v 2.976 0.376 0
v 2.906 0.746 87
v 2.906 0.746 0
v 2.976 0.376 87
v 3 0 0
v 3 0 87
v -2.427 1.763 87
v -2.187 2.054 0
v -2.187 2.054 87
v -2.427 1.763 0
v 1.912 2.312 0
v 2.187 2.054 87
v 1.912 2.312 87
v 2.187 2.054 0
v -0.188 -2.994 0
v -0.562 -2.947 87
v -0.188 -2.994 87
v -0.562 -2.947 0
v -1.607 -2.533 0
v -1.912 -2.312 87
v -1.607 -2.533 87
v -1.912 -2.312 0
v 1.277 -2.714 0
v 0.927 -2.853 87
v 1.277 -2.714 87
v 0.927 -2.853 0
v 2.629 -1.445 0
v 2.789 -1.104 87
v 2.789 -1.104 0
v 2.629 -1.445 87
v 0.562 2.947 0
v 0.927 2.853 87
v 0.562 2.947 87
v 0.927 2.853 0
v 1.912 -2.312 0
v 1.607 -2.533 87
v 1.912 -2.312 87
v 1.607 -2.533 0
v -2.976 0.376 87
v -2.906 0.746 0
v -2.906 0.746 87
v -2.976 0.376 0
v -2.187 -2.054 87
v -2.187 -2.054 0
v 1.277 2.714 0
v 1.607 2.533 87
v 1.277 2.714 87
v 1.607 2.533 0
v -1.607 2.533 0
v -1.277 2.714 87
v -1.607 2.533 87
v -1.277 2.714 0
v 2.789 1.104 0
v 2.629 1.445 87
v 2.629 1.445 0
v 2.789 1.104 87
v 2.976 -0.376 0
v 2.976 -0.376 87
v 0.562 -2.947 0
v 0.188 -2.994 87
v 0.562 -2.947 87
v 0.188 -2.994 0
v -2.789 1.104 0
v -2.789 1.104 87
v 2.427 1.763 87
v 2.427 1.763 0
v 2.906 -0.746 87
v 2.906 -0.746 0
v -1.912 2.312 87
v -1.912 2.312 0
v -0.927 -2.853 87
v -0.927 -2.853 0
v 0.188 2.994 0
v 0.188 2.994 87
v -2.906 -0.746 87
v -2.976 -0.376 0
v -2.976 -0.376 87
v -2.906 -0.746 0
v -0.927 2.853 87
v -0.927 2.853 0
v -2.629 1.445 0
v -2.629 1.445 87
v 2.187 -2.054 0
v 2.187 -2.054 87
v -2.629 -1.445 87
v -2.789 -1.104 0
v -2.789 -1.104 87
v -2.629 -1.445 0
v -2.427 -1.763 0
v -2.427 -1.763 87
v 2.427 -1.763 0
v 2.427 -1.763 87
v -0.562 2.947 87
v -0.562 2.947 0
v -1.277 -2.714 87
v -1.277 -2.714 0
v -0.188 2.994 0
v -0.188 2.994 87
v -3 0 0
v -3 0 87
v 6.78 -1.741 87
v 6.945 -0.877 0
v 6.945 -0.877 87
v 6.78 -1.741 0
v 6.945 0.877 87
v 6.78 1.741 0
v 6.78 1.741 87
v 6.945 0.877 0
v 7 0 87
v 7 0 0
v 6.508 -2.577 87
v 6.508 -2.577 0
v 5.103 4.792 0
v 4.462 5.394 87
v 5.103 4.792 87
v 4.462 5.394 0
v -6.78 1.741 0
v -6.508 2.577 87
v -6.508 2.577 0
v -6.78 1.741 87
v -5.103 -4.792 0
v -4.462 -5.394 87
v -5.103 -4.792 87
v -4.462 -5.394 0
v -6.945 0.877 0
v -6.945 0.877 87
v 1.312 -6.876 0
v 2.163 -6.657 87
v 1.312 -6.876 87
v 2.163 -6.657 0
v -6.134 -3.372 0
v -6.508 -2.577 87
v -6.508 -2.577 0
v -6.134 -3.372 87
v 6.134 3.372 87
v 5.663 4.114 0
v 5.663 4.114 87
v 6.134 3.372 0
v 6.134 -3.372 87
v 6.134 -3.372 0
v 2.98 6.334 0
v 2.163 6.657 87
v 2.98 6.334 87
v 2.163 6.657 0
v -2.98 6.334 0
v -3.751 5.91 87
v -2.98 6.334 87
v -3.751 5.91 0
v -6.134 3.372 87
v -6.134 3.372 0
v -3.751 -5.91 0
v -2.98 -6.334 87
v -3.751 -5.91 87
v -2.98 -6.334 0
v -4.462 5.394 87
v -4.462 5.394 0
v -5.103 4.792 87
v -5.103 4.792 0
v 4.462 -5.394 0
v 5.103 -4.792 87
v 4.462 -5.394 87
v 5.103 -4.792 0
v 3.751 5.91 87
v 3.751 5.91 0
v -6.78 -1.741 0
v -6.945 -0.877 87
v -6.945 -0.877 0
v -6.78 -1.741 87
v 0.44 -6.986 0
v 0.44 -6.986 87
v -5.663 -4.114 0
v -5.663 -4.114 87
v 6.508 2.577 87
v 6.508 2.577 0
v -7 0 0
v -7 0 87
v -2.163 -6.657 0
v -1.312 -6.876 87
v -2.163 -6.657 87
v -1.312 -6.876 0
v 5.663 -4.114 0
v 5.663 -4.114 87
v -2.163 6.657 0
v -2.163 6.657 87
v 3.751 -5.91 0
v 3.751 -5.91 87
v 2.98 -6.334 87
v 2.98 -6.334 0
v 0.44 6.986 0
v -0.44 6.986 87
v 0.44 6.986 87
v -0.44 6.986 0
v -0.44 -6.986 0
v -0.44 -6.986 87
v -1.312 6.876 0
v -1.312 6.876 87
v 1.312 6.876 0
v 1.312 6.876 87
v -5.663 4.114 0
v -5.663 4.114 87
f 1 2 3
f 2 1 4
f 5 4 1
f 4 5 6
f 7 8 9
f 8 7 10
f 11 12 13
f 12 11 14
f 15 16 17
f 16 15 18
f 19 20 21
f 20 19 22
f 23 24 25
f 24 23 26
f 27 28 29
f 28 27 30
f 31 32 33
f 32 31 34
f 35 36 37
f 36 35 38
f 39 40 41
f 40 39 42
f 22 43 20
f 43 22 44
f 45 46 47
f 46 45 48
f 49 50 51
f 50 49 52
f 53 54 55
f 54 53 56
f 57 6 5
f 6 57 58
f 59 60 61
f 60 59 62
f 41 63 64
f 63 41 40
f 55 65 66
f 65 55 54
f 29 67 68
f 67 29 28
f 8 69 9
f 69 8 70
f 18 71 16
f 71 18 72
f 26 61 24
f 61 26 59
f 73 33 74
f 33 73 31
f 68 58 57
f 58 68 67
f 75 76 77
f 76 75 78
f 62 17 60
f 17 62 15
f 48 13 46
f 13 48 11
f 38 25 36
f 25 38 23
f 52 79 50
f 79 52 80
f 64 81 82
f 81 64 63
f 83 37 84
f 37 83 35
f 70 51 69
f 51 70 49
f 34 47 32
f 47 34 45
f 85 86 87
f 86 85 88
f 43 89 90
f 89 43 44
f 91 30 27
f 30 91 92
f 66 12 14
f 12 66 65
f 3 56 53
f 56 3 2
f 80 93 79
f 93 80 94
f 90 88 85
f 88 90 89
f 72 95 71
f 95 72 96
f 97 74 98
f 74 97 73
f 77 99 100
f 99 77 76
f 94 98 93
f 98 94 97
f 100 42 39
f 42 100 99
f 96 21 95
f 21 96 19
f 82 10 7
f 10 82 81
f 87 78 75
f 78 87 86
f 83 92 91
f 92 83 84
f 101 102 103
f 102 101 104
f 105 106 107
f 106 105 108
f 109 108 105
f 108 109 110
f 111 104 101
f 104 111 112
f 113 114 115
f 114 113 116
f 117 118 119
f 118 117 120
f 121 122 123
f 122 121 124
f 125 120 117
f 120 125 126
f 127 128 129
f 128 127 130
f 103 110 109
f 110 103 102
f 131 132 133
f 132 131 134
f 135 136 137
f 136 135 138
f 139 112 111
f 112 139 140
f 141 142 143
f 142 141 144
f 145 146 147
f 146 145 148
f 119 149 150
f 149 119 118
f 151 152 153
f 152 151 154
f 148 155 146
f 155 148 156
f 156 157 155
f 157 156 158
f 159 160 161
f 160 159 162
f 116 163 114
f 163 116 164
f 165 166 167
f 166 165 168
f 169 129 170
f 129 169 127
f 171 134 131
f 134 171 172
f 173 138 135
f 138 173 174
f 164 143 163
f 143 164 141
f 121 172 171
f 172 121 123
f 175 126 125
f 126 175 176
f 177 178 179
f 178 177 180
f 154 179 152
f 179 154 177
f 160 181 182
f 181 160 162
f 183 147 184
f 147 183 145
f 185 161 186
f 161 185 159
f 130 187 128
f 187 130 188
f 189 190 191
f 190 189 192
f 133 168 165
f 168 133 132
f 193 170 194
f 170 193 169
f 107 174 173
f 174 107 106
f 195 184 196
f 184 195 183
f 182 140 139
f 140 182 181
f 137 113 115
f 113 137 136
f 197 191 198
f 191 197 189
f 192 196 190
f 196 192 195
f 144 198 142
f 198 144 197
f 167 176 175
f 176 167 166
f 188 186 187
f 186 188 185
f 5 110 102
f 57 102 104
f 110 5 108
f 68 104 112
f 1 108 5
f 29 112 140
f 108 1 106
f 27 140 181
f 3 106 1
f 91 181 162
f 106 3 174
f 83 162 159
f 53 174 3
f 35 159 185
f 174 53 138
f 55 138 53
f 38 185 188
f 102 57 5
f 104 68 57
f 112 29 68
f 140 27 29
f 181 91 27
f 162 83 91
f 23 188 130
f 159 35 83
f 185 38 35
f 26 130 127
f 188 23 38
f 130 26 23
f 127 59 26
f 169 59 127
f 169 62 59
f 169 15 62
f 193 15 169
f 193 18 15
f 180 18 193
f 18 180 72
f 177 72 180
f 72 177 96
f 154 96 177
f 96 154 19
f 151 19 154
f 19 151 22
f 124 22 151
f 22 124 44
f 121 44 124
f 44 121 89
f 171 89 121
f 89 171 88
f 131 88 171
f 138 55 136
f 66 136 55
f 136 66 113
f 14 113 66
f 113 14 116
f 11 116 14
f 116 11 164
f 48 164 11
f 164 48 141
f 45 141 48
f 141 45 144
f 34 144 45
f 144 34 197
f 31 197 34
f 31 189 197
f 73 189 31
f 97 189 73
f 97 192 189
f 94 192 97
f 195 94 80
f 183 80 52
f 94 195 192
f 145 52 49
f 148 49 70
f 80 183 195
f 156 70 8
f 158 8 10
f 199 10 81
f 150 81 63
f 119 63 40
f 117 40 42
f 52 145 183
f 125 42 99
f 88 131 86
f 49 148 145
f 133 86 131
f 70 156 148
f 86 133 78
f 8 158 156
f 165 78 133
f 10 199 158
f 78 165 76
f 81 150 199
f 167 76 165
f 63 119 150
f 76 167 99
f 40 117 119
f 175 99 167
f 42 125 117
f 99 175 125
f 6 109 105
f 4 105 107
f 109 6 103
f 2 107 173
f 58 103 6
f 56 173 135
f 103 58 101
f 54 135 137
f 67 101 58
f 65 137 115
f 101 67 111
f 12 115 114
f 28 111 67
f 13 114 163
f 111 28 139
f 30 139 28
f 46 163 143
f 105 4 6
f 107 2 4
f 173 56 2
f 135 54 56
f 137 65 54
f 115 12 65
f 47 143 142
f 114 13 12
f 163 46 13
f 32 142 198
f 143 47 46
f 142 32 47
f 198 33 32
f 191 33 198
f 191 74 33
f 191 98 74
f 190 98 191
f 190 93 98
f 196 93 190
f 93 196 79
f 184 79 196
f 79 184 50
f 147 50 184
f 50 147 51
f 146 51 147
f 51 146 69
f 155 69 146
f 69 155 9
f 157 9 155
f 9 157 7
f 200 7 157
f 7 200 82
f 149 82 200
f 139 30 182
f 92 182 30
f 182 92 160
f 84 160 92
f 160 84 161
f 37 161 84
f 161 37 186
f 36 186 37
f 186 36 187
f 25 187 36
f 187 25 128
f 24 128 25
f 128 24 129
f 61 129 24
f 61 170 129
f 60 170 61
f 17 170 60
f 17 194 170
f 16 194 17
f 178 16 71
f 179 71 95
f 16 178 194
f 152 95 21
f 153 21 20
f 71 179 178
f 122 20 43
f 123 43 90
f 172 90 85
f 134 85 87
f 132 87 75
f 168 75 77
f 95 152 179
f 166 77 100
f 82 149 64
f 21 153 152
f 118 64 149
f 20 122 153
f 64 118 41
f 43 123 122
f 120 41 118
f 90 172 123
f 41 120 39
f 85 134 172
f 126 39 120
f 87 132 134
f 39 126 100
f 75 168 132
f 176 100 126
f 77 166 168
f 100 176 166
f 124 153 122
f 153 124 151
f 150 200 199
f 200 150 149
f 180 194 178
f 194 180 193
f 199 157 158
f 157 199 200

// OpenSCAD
$fn = 50;


difference() {
	union() {
		cylinder(h = 87, r = 7.0000000000);
	}
	union() {
		translate(v = [0.0000000000, 0.0000000000, -100.0000000000]) {
			cylinder(h = 200, r = 3.0000000000);
		}
		cylinder(h = 87, r = 1.5000000000);
		cylinder(h = 87, r = 1.5000000000);
		cylinder(h = 87, r = 1.5000000000);
	}
}
